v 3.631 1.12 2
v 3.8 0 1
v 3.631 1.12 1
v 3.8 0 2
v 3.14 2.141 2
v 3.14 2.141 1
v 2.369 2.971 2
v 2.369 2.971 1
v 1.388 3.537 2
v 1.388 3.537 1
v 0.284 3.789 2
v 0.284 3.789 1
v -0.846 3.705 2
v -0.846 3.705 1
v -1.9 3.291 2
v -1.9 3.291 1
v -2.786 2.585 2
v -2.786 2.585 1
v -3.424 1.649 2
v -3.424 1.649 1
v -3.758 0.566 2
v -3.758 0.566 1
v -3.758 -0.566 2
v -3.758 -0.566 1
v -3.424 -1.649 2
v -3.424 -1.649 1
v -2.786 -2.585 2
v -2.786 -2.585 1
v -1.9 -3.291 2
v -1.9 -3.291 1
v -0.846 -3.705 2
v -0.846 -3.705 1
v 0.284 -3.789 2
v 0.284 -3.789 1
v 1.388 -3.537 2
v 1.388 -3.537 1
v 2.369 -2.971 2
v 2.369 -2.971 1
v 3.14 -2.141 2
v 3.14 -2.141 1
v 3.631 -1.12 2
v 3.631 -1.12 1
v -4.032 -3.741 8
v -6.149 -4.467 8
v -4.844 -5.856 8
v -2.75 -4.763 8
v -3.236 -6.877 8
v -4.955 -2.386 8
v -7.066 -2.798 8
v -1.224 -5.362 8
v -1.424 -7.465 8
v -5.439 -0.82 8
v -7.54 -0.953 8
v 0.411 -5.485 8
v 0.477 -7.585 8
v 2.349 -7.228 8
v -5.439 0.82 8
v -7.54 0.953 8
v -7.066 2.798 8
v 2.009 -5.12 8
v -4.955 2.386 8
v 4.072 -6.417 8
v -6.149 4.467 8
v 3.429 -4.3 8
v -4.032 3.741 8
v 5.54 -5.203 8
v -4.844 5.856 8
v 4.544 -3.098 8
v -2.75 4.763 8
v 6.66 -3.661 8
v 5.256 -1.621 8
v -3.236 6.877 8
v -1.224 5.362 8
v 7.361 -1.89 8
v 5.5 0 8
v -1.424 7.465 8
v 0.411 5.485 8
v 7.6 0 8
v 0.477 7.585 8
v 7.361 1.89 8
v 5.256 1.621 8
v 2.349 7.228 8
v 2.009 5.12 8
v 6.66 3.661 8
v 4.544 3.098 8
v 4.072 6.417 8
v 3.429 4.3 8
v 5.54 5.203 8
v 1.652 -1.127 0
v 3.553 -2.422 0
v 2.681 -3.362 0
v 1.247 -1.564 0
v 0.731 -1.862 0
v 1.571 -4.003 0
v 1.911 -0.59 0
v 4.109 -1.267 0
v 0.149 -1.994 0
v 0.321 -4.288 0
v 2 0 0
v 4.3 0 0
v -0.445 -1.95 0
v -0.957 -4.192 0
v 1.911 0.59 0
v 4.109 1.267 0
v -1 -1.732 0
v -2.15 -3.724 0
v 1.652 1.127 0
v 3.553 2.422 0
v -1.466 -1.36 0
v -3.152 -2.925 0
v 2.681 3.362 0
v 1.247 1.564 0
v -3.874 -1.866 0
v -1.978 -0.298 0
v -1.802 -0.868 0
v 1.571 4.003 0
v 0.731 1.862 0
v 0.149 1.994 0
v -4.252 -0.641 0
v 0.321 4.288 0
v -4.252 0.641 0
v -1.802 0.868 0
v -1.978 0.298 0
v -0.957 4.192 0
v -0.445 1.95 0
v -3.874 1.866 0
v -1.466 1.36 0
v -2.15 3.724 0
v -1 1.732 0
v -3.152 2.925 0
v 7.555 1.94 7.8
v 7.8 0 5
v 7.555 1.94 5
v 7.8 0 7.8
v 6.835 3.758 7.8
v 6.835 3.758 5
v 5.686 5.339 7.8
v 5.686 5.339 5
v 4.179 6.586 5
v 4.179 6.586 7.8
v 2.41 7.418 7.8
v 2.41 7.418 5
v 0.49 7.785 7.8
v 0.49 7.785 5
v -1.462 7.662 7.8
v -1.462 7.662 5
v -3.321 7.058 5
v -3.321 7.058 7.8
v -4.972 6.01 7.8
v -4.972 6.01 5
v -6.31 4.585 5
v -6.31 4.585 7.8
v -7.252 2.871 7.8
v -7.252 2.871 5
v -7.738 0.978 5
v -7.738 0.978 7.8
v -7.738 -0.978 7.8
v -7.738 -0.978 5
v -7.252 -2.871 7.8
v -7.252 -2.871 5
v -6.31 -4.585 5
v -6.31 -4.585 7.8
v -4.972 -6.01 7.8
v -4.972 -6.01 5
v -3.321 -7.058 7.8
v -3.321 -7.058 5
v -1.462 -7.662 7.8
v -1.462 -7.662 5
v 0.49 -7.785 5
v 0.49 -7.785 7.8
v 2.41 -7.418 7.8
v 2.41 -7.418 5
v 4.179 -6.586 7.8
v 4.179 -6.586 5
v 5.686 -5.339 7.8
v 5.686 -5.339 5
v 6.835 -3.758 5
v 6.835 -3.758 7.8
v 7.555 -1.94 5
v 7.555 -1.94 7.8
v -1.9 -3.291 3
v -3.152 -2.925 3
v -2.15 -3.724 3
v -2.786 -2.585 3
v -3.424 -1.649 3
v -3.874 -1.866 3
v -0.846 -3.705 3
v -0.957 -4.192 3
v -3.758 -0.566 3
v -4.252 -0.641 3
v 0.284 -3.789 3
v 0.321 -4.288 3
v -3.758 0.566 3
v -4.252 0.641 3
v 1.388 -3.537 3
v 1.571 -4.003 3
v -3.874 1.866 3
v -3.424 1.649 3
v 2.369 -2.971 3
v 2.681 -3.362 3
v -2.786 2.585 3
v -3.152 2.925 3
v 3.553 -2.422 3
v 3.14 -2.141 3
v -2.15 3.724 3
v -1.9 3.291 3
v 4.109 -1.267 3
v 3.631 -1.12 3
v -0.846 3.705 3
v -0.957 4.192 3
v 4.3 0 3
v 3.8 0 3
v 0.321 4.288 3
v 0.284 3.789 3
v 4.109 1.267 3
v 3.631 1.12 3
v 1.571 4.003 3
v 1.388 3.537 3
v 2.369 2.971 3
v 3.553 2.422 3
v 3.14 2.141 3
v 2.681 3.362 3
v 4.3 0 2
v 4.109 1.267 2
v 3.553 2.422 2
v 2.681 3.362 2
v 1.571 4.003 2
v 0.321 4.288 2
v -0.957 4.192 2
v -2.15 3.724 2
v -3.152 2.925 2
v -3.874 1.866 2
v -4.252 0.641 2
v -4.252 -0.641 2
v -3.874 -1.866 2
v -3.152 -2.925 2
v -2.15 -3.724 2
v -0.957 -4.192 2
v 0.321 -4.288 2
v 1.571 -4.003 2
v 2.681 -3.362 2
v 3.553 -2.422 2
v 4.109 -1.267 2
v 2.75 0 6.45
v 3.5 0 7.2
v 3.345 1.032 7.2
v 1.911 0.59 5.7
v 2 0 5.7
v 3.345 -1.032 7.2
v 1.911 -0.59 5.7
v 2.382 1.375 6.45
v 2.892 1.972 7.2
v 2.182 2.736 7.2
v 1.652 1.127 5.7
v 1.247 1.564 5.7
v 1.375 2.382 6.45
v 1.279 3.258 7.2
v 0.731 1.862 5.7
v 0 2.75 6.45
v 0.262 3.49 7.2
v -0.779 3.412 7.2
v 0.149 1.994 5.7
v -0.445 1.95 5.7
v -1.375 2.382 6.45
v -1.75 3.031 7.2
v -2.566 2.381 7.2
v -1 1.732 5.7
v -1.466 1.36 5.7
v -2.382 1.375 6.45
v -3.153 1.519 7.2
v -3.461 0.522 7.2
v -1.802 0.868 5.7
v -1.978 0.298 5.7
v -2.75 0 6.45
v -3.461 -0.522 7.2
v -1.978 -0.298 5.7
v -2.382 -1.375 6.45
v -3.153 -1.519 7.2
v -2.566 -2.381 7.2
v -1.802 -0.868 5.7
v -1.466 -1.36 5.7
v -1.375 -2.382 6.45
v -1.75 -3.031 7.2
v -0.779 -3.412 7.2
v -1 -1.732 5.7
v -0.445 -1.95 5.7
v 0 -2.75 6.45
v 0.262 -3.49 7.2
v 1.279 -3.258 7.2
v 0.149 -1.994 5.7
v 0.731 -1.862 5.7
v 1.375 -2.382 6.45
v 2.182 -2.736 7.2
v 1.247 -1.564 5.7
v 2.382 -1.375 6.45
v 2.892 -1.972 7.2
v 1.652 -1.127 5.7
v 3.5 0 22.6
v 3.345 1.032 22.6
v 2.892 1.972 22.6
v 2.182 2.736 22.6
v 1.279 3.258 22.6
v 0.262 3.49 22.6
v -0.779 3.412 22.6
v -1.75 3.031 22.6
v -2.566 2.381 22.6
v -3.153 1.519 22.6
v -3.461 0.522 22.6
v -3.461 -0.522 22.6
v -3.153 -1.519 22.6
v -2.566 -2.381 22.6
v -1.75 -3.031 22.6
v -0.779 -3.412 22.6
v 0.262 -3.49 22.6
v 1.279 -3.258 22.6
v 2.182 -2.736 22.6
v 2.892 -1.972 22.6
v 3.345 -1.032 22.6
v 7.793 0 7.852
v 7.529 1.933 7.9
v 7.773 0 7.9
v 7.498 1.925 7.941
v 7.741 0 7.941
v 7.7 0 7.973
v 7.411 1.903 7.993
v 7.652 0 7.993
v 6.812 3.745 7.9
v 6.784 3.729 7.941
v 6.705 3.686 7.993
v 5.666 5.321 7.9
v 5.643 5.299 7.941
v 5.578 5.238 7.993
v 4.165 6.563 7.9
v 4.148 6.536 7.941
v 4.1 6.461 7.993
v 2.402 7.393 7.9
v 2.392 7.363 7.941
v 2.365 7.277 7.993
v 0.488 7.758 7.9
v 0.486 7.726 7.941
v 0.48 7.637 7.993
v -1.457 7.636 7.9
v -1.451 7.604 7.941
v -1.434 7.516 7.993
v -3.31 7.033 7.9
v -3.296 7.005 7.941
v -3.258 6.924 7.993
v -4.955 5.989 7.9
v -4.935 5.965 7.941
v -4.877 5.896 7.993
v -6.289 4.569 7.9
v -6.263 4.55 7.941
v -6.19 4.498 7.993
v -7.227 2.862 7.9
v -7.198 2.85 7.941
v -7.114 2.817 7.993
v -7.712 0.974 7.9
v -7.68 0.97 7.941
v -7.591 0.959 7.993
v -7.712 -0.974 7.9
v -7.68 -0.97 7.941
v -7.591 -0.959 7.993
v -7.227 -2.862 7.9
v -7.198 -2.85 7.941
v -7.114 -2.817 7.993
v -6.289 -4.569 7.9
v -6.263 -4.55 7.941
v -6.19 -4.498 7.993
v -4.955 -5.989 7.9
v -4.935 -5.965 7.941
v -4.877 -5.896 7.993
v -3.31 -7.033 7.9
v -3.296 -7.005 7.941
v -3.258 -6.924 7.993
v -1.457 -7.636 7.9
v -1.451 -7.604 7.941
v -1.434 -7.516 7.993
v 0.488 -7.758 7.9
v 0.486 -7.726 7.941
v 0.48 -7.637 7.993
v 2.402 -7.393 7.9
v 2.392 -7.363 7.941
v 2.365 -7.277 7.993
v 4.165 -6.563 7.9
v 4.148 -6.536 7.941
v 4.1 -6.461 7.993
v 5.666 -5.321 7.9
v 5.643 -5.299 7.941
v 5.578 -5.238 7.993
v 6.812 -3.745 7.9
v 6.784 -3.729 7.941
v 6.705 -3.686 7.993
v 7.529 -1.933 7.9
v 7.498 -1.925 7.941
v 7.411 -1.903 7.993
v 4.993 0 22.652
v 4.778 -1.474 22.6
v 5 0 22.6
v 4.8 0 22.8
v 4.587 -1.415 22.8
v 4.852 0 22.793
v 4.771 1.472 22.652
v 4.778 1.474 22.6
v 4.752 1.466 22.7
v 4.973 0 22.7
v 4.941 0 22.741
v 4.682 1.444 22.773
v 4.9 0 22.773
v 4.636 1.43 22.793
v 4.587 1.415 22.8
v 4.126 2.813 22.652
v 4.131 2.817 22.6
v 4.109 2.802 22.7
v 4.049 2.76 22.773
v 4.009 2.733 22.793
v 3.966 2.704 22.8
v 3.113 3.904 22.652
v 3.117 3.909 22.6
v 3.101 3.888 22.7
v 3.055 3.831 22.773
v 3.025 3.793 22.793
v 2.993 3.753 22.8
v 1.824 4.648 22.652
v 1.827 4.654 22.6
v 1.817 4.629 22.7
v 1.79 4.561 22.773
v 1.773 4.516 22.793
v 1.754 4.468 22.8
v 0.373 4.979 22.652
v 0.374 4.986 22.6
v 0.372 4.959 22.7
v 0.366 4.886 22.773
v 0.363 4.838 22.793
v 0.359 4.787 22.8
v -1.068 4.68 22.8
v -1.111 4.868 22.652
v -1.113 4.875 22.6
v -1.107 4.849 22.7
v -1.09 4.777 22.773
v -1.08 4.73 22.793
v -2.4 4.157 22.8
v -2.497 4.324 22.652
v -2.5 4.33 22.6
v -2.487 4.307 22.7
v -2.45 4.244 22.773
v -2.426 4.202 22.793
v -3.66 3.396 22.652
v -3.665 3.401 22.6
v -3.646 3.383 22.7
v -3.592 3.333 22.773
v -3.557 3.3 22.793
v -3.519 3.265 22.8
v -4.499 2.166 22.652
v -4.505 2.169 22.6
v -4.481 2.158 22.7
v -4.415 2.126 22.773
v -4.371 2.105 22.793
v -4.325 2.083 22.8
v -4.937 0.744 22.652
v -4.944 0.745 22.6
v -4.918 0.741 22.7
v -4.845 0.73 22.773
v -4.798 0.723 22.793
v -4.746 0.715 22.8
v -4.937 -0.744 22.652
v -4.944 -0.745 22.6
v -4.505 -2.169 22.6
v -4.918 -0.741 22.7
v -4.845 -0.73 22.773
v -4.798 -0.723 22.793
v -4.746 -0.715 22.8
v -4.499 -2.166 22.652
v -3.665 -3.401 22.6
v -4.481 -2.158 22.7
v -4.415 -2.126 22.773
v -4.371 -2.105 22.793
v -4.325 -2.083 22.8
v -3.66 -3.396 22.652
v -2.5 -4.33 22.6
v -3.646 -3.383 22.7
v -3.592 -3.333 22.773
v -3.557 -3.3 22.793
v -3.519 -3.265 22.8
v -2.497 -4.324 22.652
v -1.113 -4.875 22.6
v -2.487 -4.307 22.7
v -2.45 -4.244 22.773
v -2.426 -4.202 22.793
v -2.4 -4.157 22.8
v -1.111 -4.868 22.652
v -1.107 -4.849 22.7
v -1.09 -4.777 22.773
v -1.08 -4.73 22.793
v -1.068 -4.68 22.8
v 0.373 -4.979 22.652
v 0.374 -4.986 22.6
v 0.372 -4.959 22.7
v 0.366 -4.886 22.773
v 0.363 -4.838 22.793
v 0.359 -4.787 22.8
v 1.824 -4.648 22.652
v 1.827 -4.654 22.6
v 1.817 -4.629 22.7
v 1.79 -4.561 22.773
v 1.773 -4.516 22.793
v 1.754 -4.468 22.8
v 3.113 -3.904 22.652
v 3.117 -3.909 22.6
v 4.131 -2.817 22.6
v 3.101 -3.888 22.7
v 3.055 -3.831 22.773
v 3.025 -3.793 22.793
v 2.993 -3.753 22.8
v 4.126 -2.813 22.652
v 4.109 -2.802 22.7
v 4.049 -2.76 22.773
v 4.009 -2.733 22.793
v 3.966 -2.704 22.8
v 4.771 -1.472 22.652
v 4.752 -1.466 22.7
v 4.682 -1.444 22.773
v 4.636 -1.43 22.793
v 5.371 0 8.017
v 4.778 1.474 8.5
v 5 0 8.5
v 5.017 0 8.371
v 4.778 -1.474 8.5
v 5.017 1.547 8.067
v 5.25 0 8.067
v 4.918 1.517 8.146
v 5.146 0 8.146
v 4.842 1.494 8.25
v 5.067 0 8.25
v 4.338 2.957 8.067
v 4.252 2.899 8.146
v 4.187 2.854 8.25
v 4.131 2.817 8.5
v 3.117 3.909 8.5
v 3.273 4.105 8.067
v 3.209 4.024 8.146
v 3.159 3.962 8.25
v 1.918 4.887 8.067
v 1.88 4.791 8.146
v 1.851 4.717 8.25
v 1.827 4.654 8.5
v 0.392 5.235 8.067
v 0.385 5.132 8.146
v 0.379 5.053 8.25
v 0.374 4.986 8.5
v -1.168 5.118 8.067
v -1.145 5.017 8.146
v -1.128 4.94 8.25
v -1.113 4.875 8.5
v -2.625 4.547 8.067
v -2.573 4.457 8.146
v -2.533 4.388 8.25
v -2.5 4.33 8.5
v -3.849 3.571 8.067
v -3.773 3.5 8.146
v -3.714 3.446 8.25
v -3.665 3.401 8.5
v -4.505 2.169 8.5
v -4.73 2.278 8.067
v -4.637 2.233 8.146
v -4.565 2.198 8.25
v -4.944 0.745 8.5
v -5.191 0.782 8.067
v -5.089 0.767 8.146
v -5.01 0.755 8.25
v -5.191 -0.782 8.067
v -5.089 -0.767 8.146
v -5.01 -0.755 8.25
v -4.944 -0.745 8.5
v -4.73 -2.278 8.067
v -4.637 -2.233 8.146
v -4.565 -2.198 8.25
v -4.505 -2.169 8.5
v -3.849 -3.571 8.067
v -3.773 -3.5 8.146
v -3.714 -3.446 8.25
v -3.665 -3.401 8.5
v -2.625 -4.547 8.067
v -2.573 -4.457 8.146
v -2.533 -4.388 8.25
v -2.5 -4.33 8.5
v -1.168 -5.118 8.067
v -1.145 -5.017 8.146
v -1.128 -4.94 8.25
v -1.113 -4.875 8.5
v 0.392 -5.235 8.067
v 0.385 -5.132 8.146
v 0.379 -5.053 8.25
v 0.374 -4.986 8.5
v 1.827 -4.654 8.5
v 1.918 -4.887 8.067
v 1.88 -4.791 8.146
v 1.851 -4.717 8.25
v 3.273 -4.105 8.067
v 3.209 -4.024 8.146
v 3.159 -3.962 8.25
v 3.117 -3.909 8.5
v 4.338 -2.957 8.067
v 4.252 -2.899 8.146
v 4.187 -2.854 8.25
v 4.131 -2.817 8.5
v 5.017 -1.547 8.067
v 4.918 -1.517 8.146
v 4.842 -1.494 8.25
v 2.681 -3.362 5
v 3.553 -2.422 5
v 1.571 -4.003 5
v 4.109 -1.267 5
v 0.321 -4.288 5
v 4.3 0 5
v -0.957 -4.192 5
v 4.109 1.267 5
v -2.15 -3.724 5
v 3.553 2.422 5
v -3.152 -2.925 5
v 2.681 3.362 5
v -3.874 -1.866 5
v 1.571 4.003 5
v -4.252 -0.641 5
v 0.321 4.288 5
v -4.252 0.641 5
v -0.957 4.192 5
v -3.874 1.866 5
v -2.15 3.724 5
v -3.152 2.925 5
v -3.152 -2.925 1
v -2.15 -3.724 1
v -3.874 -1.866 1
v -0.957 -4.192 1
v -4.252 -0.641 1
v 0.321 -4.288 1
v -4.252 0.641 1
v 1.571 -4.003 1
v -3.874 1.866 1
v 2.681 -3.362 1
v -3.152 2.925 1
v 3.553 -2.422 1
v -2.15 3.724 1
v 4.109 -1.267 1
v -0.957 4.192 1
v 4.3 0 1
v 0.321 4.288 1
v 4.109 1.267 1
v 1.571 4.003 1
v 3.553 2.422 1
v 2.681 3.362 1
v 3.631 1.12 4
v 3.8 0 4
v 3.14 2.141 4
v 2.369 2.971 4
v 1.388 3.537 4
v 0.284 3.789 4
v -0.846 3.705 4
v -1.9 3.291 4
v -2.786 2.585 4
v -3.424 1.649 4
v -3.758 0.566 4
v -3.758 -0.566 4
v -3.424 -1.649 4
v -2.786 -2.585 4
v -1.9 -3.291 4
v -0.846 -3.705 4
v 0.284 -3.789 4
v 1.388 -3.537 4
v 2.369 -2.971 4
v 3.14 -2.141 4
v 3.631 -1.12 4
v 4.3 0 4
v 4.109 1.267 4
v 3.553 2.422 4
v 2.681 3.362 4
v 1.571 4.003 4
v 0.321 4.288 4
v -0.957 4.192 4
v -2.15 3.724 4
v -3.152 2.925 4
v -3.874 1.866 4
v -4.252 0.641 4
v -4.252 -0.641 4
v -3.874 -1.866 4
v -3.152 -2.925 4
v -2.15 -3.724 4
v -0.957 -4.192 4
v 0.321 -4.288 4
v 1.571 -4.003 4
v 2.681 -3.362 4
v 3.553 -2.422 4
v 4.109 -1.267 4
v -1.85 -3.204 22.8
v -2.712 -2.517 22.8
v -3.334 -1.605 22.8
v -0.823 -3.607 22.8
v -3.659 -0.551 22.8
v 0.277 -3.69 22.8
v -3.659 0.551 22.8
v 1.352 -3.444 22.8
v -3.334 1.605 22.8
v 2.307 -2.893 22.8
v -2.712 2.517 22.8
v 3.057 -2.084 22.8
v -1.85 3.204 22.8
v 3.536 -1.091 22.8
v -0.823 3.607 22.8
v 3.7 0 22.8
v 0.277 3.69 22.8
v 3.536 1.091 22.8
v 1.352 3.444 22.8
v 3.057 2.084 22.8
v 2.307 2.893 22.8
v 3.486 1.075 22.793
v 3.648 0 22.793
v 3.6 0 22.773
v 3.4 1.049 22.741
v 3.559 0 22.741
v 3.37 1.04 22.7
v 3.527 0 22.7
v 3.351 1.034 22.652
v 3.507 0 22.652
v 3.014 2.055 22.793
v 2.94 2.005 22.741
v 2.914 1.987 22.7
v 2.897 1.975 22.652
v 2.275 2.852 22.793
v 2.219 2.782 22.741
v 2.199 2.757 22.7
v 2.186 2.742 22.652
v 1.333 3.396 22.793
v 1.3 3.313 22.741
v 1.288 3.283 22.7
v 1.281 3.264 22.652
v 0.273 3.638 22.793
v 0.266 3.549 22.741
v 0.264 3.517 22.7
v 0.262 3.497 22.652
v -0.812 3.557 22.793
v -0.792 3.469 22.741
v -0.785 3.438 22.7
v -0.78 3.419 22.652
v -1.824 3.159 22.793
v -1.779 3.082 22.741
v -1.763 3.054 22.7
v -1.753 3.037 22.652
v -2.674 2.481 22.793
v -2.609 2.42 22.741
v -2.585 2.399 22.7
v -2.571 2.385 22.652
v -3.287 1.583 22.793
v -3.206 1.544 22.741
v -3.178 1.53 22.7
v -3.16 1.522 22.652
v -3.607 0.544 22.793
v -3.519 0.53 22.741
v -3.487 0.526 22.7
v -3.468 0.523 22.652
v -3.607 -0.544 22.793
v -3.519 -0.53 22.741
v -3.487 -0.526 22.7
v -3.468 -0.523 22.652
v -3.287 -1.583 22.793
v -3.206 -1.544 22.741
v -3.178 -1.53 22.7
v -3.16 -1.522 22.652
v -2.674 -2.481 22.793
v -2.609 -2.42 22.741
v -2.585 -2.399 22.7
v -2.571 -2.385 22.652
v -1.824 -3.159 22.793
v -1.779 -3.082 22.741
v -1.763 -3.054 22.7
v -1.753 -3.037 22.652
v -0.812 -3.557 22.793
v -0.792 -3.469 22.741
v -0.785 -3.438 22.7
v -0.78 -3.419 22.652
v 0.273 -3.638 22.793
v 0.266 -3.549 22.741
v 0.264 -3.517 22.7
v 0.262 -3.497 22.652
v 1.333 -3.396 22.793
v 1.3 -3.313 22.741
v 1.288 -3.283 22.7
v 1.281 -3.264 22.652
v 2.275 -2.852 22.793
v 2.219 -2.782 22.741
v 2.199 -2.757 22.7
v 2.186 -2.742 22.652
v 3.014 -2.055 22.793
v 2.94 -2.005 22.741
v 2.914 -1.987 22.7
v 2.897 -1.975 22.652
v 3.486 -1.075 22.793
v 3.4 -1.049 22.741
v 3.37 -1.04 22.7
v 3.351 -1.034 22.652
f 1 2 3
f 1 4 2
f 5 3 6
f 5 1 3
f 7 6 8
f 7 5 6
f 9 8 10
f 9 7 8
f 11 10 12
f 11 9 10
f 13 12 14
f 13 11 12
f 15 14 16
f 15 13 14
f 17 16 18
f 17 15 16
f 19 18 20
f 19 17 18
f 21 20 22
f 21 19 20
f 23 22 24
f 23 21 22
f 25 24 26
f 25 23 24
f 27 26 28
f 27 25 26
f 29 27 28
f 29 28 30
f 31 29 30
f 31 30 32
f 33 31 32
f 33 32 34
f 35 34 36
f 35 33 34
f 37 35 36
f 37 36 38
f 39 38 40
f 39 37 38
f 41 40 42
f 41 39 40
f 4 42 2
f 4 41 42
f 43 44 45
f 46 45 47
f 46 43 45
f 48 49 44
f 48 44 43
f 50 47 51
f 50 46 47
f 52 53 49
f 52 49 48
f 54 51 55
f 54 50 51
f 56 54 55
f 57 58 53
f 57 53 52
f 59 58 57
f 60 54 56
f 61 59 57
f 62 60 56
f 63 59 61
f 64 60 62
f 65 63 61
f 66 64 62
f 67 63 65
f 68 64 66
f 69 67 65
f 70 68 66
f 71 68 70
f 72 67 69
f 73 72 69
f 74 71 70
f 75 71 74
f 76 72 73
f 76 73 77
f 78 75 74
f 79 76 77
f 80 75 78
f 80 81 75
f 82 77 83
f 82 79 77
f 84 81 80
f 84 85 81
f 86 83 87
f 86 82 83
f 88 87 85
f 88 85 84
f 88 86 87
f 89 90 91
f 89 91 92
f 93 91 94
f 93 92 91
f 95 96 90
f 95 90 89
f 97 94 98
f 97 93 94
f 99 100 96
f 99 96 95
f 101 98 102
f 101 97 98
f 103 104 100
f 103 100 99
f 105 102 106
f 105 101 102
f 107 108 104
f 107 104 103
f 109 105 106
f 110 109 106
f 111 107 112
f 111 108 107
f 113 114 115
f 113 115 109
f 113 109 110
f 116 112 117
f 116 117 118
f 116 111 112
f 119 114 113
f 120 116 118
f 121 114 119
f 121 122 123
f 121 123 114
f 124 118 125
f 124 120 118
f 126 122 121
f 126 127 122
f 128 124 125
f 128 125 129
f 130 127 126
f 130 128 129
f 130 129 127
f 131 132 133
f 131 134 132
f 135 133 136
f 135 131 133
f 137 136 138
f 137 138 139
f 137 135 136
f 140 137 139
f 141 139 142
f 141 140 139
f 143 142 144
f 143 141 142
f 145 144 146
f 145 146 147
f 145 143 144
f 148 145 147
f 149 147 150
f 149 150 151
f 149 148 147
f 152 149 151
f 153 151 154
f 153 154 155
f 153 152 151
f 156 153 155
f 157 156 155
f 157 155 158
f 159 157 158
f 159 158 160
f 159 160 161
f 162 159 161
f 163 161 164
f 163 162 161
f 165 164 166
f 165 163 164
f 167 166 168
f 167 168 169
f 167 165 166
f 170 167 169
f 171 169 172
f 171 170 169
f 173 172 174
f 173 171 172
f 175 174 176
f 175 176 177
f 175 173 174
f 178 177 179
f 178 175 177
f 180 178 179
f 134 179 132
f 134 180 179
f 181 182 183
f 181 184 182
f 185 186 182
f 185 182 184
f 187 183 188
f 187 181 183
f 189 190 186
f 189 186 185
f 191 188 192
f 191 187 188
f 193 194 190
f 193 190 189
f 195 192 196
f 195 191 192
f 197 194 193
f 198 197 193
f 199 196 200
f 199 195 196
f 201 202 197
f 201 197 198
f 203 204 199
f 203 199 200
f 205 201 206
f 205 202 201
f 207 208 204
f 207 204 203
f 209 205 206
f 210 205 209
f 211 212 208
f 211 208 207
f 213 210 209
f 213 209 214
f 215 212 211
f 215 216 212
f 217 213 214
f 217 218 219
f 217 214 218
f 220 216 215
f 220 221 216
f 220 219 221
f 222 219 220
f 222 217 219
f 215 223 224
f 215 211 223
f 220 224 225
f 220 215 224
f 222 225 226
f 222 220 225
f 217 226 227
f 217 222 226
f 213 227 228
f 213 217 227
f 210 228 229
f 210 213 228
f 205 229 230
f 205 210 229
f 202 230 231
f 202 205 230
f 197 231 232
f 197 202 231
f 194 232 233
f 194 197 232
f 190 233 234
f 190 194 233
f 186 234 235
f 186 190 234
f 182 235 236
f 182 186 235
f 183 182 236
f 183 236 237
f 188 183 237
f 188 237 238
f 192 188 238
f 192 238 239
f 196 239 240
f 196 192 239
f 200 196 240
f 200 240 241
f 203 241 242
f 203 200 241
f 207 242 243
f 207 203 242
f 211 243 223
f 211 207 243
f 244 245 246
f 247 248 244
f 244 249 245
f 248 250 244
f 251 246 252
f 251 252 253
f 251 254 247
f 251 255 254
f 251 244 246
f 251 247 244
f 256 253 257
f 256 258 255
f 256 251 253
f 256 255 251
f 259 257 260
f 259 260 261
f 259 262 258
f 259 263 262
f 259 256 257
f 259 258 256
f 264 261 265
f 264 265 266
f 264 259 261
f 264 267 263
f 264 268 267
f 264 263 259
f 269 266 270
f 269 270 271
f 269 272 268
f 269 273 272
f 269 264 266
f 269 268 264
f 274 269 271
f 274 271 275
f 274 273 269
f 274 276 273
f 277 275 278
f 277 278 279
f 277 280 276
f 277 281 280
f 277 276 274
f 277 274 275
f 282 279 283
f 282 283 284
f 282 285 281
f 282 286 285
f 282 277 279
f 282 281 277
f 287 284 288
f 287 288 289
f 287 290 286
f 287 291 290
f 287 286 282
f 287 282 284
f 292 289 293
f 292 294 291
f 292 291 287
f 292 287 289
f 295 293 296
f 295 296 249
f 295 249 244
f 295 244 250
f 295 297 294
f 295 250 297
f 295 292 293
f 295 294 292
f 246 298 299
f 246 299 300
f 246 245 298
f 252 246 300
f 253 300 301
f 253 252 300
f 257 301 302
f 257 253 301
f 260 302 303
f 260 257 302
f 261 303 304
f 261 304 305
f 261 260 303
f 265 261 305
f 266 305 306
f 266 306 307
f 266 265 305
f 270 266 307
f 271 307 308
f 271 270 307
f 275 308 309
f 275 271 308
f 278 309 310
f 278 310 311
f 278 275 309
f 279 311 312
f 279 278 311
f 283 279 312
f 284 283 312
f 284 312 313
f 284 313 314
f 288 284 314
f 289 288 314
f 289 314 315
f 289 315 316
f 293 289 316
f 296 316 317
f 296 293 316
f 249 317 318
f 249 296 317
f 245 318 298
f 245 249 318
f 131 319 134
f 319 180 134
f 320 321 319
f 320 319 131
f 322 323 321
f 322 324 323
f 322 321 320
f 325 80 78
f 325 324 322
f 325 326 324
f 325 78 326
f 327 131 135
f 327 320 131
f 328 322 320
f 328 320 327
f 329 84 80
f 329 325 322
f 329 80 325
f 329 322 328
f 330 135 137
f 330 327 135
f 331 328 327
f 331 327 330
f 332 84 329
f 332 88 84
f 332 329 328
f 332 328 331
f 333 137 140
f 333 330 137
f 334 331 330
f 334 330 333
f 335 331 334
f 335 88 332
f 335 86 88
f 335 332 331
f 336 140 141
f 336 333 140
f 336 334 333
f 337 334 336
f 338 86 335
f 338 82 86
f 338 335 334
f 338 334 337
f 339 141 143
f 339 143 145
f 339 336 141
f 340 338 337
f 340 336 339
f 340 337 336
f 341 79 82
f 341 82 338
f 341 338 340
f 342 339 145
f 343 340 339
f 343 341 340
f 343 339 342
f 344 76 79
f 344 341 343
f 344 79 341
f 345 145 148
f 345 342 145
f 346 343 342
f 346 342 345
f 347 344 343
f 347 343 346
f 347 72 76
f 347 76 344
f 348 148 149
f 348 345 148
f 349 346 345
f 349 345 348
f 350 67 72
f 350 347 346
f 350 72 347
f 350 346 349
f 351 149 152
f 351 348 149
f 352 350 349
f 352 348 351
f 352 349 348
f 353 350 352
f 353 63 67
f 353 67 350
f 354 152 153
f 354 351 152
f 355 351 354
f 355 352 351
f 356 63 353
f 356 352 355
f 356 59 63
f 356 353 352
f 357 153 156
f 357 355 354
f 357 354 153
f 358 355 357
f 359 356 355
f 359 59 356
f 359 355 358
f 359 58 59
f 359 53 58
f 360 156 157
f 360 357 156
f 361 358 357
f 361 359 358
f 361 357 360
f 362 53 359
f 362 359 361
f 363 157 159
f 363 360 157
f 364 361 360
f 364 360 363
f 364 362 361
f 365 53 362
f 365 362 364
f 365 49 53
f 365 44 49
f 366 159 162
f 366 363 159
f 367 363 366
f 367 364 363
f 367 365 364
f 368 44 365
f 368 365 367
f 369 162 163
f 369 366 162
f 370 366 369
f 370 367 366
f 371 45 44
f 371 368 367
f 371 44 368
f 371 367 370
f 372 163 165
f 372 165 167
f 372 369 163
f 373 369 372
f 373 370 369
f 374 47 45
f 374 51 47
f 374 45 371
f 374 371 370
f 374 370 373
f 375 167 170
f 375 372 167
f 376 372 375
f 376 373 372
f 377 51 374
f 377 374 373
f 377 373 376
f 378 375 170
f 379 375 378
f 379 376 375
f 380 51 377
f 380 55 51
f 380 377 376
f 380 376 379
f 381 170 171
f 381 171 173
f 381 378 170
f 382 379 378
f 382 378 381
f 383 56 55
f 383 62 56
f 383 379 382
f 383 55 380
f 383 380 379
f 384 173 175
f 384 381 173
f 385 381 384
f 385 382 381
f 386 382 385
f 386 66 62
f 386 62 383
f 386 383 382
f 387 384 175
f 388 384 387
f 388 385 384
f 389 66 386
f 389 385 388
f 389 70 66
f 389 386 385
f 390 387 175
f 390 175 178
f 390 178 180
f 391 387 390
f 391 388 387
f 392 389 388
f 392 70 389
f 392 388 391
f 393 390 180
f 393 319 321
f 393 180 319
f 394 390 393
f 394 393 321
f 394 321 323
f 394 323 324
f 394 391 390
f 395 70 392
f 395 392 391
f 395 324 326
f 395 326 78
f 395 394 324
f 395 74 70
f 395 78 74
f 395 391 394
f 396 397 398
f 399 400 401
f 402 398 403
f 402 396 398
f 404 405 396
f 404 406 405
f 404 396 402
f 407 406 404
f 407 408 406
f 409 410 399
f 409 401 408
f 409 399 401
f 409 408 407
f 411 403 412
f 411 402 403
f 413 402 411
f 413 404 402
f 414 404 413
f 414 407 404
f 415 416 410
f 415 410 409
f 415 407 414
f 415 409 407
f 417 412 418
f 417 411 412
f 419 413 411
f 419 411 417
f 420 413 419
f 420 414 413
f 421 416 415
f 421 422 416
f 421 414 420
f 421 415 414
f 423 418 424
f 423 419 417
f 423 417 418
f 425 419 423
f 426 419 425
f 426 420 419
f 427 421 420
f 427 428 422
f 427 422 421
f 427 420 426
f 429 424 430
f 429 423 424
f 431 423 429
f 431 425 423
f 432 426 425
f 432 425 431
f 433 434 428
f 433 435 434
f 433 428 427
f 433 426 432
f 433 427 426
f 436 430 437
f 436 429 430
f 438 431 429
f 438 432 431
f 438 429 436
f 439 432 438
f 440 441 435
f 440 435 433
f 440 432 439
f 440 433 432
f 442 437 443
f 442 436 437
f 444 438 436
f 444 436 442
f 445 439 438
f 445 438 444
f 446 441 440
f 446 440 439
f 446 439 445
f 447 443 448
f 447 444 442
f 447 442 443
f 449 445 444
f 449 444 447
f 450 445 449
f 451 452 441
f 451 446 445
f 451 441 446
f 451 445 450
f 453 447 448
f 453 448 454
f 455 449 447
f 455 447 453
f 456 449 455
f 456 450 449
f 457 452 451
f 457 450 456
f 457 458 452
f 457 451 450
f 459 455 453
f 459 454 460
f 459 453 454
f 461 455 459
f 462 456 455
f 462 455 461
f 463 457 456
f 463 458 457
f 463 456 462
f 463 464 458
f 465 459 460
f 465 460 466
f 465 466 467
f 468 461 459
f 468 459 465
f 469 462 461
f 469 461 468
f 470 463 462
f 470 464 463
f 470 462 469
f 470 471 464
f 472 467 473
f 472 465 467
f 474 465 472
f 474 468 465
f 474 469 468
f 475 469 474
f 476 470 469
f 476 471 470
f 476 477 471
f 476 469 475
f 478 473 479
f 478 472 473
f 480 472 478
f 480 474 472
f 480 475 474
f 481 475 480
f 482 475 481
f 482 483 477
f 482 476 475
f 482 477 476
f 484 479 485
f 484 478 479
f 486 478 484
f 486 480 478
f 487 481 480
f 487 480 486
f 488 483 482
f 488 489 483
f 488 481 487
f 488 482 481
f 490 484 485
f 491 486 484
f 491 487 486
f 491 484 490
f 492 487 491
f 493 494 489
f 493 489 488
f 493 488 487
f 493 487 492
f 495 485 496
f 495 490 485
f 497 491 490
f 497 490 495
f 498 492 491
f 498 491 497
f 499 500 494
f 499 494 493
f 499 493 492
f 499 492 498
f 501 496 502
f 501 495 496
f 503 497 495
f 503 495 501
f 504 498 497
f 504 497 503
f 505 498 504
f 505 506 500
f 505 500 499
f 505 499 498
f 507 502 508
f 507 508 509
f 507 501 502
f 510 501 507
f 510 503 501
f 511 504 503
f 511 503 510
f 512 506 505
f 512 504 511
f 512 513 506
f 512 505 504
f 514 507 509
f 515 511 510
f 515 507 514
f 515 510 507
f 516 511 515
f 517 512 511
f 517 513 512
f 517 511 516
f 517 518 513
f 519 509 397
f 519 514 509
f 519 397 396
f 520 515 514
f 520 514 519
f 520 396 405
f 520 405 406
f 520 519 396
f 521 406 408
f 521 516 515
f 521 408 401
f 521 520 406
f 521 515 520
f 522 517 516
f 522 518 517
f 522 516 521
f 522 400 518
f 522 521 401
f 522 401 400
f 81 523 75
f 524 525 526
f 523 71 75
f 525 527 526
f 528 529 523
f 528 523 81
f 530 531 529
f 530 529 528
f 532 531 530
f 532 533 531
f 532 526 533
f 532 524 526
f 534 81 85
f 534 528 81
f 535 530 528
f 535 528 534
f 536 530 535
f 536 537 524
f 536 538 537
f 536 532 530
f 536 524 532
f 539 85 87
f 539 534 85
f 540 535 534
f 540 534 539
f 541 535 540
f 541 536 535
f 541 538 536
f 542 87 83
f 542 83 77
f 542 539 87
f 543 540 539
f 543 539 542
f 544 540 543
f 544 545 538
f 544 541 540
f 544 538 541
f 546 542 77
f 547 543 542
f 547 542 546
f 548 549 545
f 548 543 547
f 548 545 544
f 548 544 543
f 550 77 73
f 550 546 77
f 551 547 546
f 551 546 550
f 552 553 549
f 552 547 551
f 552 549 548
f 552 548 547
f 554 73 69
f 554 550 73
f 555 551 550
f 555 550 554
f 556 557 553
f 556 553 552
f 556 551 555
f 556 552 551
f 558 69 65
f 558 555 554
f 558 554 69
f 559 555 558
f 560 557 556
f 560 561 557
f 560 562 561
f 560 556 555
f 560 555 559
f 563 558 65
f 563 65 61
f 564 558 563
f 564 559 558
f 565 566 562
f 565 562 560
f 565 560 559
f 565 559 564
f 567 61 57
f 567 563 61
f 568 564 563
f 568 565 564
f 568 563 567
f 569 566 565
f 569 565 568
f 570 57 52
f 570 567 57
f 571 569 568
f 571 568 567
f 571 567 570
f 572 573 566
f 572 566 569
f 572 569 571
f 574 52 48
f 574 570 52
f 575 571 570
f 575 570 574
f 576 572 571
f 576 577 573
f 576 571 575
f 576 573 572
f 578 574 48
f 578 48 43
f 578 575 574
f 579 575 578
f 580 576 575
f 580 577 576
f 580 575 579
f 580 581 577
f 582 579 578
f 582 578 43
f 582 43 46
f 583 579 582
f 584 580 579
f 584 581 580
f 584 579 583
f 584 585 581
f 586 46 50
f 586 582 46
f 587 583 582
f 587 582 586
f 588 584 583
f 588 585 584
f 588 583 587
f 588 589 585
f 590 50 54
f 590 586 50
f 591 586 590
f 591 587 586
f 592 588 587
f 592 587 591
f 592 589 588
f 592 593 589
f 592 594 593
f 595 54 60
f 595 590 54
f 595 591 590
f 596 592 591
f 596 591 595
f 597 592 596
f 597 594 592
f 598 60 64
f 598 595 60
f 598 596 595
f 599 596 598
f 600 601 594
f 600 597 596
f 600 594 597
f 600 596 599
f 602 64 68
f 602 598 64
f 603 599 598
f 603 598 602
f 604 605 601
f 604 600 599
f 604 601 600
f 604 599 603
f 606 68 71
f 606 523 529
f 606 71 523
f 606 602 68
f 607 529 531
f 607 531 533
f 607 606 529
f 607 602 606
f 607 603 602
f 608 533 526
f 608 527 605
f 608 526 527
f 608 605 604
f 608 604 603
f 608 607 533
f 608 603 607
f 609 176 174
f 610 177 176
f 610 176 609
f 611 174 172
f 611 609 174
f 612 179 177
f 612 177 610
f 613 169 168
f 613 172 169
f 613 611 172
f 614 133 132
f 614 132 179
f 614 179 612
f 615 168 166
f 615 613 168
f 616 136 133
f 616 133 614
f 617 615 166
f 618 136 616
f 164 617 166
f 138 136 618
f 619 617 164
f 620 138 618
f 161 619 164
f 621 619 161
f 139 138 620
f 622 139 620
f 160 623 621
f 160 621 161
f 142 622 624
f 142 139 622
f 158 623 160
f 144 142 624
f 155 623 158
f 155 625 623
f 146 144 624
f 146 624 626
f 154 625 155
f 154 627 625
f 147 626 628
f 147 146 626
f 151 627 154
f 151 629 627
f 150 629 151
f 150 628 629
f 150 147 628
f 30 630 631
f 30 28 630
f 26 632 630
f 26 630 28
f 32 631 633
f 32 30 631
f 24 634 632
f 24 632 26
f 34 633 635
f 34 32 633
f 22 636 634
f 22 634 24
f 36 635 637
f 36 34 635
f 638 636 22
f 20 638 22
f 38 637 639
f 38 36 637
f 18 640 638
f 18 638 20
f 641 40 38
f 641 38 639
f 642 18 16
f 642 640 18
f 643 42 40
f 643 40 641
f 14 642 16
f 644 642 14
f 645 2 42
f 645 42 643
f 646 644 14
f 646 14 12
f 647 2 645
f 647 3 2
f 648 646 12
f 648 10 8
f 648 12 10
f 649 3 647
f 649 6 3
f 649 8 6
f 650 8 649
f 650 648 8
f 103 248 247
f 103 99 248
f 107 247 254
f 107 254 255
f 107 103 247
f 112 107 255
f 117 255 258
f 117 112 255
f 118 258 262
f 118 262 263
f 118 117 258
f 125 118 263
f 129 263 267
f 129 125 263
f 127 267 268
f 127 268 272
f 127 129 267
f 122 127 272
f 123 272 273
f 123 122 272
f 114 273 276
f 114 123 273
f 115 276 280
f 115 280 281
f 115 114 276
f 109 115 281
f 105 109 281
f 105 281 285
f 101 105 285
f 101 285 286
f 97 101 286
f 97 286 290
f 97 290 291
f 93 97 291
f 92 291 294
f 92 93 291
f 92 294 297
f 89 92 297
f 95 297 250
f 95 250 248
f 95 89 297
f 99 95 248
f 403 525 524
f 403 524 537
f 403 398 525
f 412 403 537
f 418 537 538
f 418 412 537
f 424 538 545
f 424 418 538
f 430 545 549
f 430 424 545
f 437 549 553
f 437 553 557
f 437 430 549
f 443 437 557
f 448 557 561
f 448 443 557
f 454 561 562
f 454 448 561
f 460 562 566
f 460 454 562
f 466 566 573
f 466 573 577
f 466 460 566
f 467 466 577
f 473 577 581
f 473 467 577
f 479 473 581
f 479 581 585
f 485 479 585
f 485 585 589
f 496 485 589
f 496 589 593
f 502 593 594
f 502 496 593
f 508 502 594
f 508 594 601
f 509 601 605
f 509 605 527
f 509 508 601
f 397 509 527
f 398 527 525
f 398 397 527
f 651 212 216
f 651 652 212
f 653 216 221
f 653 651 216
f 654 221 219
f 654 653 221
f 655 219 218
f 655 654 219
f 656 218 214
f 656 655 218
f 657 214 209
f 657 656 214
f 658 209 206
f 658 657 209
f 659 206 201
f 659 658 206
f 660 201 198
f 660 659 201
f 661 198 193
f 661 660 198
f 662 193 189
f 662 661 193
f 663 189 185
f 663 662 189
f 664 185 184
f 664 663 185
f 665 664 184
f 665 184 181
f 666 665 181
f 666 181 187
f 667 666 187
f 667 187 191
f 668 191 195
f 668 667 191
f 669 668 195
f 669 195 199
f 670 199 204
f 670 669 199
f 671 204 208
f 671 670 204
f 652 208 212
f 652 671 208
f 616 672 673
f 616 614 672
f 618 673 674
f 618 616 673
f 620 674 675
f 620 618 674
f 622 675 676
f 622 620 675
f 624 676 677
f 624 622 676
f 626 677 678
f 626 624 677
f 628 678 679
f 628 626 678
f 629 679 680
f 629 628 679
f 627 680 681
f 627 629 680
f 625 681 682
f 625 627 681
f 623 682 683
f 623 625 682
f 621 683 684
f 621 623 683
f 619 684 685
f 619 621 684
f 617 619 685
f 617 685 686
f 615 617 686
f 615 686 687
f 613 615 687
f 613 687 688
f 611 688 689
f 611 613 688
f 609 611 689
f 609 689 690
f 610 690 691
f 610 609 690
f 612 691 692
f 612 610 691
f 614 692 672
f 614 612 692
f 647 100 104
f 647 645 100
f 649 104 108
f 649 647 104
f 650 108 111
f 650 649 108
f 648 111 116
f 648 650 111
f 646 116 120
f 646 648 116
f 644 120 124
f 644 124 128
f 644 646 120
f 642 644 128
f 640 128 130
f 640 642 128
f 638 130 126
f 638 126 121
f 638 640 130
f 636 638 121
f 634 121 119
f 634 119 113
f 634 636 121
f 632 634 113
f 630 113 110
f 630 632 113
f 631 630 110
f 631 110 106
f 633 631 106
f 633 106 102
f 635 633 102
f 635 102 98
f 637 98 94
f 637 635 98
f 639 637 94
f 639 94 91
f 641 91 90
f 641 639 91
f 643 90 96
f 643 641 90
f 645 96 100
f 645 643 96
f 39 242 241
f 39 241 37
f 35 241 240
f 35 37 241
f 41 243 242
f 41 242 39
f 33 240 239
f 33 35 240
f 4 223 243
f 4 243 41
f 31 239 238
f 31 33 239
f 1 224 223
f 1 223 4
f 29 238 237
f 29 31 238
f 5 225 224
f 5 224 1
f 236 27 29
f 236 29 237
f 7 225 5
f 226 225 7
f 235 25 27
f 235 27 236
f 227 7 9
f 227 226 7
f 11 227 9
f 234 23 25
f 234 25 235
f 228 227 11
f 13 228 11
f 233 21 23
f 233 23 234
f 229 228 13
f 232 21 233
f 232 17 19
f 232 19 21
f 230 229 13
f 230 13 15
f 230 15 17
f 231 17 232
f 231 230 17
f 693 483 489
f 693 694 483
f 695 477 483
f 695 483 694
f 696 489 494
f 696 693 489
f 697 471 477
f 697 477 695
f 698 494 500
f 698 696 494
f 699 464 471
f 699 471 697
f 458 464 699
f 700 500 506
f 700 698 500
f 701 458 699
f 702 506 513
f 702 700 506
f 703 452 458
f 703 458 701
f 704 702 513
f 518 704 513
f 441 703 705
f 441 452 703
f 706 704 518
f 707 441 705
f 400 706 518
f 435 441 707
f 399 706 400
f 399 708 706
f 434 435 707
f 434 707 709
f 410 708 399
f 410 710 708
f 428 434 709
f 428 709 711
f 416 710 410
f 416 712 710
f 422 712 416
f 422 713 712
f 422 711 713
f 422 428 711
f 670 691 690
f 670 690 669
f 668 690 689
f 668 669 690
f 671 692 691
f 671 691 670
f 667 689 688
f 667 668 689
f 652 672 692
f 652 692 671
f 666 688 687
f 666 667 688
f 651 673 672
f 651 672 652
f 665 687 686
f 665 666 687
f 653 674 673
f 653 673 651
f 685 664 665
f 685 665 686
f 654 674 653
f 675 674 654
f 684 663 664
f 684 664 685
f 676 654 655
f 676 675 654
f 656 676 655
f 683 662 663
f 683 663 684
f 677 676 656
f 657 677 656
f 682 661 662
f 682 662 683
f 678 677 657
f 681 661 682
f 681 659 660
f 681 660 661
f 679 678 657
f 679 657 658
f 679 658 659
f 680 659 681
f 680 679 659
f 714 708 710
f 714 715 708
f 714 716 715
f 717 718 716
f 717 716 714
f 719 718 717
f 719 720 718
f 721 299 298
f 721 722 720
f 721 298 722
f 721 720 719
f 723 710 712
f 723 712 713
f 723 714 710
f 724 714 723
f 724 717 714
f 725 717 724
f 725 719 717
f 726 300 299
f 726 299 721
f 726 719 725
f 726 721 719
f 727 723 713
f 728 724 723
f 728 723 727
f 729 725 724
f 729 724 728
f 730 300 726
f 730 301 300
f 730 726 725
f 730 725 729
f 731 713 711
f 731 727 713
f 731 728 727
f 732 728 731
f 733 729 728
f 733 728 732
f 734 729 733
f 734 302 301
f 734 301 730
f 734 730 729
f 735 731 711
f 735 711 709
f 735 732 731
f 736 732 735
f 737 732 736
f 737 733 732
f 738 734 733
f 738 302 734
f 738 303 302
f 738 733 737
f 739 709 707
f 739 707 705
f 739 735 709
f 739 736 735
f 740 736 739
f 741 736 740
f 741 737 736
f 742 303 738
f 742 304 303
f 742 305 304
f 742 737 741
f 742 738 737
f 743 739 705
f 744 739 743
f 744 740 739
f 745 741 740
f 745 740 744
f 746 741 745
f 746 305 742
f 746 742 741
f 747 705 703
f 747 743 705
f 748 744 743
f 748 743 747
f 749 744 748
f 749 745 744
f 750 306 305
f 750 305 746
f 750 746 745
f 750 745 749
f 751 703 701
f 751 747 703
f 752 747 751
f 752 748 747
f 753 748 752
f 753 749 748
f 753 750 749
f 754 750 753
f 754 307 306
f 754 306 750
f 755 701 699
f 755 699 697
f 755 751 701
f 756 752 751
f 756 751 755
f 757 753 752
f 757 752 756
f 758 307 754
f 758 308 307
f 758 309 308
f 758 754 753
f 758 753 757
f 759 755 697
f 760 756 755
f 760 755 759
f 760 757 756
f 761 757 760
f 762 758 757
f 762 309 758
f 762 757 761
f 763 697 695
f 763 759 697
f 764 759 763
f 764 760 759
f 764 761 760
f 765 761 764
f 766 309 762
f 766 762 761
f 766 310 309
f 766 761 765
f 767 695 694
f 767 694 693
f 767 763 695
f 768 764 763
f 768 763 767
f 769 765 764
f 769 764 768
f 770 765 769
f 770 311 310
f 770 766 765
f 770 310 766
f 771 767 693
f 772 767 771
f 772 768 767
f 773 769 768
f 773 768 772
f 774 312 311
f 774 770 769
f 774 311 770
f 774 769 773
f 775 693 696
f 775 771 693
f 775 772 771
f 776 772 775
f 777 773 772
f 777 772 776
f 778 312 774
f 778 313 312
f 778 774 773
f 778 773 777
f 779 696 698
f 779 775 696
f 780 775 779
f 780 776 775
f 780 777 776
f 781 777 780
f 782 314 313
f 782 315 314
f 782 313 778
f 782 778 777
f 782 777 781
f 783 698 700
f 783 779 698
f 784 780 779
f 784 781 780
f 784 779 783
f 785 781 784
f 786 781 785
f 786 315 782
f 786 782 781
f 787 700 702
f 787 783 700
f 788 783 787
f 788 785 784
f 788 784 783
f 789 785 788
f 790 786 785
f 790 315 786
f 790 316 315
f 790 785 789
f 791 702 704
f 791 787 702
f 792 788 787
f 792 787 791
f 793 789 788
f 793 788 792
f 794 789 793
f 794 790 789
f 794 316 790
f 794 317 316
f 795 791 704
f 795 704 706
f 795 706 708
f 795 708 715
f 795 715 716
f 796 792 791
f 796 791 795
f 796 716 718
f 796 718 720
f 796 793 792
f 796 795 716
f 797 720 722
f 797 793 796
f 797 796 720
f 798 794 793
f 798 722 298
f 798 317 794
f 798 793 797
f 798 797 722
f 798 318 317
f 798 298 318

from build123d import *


with BuildPart() as f1:
    # F0 (on Front) → F1 (revolve)
    with BuildSketch(Plane.XZ):
        with BuildLine():
            Line((4.8, 22.8), (3.7, 22.8))
            ThreePointArc((3.7, 22.8), (3.558579, 22.741421), (3.5, 22.6))
            Line((3.5, 22.6), (3.5, 7.2))
            Line((3.5, 7.2), (2, 5.7))
            Line((2, 5.7), (2, 0))
            Line((2, 0), (4.3, 0))
            Line((4.3, 0), (4.3, 1))
            Line((4.3, 1), (3.8, 1))
            Line((3.8, 1), (3.8, 2))
            Line((3.8, 2), (4.3, 2))
            Line((4.3, 2), (4.3, 3))
            Line((4.3, 3), (3.8, 3))
            Line((3.8, 3), (3.8, 4))
            Line((3.8, 4), (4.3, 4))
            Line((4.3, 4), (4.3, 5))
            Line((4.3, 5), (7.8, 5))
            Line((7.8, 5), (7.8, 7.8))
            ThreePointArc((7.8, 7.8), (7.741421, 7.941421), (7.6, 8))
            Line((7.6, 8), (5.5, 8))
            ThreePointArc((5.5, 8), (5.146447, 8.146447), (5, 8.5))
            Line((5, 8.5), (5, 22.6))
            ThreePointArc((5, 22.6), (4.941421, 22.741421), (4.8, 22.8))
        make_face()
    revolve(axis=Axis((0, 0, 11.4), (0, 0, 1)))


solid = f1.part
